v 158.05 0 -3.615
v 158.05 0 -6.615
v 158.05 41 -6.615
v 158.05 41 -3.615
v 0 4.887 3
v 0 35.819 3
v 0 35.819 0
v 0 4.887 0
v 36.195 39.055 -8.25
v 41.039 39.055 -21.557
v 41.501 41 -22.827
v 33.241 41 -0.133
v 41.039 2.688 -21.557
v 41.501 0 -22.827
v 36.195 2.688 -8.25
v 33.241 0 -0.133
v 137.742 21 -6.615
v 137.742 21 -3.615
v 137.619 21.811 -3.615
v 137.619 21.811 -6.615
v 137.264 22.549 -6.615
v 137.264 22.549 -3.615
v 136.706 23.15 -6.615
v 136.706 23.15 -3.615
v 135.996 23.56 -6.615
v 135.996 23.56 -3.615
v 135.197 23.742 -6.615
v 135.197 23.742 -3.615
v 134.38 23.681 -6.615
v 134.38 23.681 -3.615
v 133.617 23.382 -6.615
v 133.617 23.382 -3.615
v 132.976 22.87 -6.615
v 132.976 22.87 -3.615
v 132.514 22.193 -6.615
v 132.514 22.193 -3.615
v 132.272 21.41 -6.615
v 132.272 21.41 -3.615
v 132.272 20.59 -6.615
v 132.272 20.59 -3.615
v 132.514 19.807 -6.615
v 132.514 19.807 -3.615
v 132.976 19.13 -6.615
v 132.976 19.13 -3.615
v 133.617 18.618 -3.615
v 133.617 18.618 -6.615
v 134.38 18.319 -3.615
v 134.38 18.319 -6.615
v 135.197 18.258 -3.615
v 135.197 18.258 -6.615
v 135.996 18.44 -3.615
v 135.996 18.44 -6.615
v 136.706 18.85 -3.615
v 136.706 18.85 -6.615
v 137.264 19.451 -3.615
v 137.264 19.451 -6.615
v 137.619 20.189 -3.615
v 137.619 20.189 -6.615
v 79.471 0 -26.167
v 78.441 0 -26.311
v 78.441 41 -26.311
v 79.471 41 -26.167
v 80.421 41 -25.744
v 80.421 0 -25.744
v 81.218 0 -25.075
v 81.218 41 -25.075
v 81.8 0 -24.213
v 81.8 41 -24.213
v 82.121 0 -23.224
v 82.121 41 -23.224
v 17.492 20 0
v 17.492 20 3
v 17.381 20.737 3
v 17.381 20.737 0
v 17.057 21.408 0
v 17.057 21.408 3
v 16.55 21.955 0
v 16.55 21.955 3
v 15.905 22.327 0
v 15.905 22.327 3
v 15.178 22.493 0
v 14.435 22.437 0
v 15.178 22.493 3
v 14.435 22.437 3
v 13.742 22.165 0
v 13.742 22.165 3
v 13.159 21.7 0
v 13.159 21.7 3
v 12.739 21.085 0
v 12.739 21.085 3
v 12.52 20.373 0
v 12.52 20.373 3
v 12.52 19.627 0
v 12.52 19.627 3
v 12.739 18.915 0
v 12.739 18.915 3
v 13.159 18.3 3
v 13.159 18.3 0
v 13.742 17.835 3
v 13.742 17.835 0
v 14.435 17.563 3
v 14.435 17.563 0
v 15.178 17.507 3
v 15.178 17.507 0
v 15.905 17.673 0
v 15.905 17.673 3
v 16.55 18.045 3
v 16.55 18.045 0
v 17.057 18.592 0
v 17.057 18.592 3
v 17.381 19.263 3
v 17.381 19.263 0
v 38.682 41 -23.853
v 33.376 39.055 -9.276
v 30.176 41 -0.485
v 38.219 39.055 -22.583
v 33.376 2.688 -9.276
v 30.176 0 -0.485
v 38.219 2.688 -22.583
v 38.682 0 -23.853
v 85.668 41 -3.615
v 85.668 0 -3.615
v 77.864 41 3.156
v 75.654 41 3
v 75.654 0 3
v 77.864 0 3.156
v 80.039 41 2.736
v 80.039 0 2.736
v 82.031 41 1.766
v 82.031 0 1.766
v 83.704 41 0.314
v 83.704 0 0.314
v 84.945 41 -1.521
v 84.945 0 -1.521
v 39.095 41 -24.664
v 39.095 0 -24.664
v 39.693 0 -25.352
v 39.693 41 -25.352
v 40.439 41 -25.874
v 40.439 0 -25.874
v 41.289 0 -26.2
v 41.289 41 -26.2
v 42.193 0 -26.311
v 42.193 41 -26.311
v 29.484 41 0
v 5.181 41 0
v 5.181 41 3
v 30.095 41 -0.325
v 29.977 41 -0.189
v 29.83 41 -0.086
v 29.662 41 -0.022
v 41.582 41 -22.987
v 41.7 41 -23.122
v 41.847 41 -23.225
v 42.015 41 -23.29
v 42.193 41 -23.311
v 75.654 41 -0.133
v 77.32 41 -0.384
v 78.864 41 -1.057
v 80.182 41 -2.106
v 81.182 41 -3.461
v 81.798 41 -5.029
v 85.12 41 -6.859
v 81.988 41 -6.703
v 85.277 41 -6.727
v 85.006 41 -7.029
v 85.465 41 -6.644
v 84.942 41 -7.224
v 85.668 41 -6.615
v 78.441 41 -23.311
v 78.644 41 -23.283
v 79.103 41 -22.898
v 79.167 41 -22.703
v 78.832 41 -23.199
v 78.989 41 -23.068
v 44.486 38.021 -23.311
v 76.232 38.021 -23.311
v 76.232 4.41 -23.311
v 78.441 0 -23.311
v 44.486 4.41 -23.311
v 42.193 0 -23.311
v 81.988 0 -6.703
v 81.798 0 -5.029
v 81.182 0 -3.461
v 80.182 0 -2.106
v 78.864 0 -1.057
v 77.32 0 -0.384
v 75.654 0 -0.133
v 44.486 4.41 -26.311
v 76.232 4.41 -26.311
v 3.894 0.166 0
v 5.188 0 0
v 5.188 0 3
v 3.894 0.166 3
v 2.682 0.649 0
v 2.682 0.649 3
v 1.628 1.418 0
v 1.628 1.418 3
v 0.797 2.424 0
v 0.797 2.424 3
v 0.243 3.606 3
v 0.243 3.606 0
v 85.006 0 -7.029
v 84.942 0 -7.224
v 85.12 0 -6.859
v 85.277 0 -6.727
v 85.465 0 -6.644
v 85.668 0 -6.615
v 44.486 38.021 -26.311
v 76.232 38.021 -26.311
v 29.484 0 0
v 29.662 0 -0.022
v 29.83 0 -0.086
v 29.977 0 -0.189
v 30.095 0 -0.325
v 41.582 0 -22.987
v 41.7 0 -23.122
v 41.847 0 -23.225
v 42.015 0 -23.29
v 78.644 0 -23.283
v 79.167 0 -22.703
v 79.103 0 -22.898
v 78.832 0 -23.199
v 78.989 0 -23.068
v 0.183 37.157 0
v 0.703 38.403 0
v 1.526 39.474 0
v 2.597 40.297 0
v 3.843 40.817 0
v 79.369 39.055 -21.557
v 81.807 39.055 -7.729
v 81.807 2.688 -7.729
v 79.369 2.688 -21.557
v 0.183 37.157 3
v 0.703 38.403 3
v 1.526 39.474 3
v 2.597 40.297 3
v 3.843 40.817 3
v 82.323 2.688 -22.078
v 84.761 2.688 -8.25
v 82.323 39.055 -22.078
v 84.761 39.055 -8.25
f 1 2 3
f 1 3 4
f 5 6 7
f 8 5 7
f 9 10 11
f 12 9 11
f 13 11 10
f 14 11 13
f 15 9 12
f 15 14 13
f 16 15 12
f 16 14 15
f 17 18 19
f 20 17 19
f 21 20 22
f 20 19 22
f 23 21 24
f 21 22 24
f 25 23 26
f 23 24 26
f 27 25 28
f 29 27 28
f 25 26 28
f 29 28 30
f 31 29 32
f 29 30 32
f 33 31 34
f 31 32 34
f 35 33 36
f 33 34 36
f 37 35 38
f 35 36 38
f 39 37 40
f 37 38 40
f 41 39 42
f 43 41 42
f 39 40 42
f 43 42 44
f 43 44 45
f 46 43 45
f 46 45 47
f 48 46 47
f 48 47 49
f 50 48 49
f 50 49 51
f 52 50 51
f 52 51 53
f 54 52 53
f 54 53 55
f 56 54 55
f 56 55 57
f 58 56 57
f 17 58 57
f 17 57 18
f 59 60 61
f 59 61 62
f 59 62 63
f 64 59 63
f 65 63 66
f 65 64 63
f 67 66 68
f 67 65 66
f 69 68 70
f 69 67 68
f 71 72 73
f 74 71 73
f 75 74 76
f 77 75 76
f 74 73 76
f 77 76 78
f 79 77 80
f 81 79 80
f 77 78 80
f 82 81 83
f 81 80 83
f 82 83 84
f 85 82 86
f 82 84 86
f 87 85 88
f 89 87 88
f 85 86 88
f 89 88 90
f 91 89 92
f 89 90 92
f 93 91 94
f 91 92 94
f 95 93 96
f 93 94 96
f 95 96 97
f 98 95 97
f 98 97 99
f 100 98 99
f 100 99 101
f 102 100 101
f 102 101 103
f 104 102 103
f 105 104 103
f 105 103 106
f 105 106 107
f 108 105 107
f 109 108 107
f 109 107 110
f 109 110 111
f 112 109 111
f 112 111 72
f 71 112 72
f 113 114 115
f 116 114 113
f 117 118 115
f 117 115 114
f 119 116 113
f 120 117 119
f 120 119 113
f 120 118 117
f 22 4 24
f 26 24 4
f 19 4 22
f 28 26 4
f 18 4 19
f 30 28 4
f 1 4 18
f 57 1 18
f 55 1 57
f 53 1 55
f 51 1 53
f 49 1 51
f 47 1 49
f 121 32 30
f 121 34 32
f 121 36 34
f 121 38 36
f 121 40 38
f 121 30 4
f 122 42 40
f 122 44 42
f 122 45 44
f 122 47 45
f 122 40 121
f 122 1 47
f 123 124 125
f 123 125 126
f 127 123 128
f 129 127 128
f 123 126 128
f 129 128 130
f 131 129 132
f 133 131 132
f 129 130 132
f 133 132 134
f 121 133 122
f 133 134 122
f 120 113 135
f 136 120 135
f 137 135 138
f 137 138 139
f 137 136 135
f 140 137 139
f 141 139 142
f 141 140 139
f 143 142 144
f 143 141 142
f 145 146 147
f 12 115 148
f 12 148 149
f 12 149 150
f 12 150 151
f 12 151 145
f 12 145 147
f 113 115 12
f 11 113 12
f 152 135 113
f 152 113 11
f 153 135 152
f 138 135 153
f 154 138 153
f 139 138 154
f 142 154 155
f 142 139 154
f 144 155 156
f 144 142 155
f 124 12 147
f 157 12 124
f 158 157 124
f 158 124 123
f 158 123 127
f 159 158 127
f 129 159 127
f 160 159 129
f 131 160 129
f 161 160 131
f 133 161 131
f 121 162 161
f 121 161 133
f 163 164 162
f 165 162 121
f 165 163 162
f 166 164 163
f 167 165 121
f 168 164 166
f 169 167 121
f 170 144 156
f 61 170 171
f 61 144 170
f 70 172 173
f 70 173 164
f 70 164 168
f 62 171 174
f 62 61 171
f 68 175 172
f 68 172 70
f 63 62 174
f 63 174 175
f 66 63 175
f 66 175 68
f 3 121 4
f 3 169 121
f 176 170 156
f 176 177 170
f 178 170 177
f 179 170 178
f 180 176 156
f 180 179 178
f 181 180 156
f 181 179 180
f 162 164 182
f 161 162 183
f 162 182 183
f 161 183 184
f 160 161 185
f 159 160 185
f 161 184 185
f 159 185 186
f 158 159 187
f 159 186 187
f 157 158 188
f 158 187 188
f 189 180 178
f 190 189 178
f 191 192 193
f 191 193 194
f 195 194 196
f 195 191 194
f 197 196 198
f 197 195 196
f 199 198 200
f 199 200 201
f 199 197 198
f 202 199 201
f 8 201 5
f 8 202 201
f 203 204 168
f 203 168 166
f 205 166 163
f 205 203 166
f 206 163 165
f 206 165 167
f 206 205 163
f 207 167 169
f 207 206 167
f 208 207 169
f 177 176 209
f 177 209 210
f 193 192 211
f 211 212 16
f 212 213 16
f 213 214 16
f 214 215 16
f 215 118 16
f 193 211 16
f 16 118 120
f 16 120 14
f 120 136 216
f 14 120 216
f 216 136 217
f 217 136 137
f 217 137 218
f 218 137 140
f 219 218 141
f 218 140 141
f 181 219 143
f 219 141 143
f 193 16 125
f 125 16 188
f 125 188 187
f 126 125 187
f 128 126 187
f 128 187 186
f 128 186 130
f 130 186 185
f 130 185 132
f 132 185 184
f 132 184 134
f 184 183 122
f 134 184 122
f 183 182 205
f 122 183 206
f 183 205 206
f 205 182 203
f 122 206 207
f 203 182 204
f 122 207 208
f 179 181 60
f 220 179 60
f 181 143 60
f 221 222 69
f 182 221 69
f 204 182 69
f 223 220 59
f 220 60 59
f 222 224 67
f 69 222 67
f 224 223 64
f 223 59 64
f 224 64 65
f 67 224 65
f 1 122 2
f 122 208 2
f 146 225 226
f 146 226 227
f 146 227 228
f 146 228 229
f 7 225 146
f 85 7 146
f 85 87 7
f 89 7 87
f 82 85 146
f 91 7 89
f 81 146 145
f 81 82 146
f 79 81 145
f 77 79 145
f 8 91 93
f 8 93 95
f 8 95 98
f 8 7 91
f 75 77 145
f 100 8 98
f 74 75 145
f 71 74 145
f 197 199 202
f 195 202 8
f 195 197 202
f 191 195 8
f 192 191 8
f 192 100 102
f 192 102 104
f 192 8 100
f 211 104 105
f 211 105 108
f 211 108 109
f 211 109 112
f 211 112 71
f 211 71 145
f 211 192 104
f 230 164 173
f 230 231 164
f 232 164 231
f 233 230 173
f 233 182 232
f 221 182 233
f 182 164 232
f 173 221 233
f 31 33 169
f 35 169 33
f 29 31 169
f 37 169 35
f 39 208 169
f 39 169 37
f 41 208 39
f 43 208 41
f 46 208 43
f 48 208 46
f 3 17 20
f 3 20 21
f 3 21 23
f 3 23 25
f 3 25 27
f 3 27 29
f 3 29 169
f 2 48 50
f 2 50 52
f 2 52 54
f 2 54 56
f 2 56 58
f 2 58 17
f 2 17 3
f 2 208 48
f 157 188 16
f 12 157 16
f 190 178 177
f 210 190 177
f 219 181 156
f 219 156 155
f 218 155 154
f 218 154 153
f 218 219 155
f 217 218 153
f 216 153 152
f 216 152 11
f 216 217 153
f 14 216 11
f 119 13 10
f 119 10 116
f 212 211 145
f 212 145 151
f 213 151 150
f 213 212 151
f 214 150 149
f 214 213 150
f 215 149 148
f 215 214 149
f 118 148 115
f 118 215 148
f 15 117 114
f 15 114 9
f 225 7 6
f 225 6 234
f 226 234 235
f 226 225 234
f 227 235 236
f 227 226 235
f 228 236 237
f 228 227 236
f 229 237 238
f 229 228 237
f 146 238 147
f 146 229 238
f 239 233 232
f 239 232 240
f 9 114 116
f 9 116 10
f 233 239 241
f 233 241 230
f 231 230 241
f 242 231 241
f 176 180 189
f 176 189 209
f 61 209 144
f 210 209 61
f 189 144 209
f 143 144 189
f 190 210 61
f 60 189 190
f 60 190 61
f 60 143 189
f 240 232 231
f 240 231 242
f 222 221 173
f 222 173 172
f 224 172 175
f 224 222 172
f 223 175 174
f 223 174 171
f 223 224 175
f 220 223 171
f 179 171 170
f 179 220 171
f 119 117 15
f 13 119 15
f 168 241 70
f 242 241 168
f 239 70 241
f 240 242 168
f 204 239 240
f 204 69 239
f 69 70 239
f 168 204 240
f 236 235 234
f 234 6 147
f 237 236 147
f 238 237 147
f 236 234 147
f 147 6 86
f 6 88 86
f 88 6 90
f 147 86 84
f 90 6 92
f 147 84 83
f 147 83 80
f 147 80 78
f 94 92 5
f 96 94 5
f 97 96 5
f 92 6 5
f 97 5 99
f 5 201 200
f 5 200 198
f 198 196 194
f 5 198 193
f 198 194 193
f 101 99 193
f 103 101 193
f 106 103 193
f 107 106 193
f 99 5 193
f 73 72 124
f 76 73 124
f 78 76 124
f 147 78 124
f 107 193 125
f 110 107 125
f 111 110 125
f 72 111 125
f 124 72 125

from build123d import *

# Parameters (mm, degrees)
BASE_FLANGE1_DEPTH  = 41
SKETCH2_R           = 2.5
CUT_EXTRUDE1_DEPTH  = 10
SKETCH3_R           = 2.75
SKETCH3_R_2         = 2.5
CUT_EXTRUDE2_DEPTH  = 10
BOSS_EXTRUDE1_START = -41
BOSS_EXTRUDE1_DEPTH = 41
SKETCH5_W           = 31.746142427
SKETCH5_H           = 33.611284957
CUT_EXTRUDE3_DEPTH  = 19
CUT_EXTRUDE4_START  = 2.688066512
CUT_EXTRUDE4_DEPTH  = 36.36668128
CUT_EXTRUDE5_DEPTH  = 3


# Read off the part's stored shape, not the designer's step: Cut-Extrude4, Cut-Extrude5
# Sheet-metal steps are written as plain solids
with BuildPart() as part:
    # Sketch1 → Base-Flange1 (new body)
    with BuildSketch(Plane(origin=(0, 0, 0), x_dir=(1, 0, 0), z_dir=(0, 1, 0))):
        with BuildLine():
            Line((0, 0), (29.484227127, 0))
            ThreePointArc((29.484227127, 0), (29.90672353, 0.133212604), (30.176404712, 0.484667962))
            Line((30.176404712, 0.484667962), (38.681704054, 23.85278585))
            ThreePointArc((38.681704054, 23.85278585), (40.049733788, 25.635636911), (42.1929595, 26.311393382))
            Line((42.1929595, 26.311393382), (78.441184331, 26.311393382))
            ThreePointArc((78.441184331, 26.311393382), (80.843024514, 25.437195048), (82.121016981, 23.223647163))
            Line((82.121016981, 23.223647163), (84.942198964, 7.223929074))
            ThreePointArc((84.942198964, 7.223929074), (85.194131001, 6.787569985), (85.667608355, 6.615238322))
            Line((85.667608355, 6.615238322), (158.049527566, 6.615238322))
            Line((158.049527566, 6.615238322), (158.049527566, 3.615238322))
            Line((158.049527566, 3.615238322), (85.667608355, 3.615238322))
            ThreePointArc((85.667608355, 3.615238322), (83.265768172, 4.489436656), (81.987775705, 6.702984541))
            Line((81.987775705, 6.702984541), (79.166593722, 22.70270263))
            ThreePointArc((79.166593722, 22.70270263), (78.914661685, 23.139061719), (78.441184331, 23.311393382))
            Line((78.441184331, 23.311393382), (42.1929595, 23.311393382))
            ThreePointArc((42.1929595, 23.311393382), (41.770463097, 23.178180778), (41.500781916, 22.82672542))
            Line((41.500781916, 22.82672542), (32.995482574, -0.541392468))
            ThreePointArc((32.995482574, -0.541392468), (31.627452839, -2.324243529), (29.484227127, -3))
            Line((29.484227127, -3), (0, -3))
            Line((0, -3), (0, 0))
        make_face()
    extrude(amount=BASE_FLANGE1_DEPTH)

    # Sketch2 → Cut-Extrude1 (cut)
    with BuildSketch(Plane.XY.offset(3)):
        with Locations((14.991664351, 20)):
            Circle(SKETCH2_R)
    extrude(amount=-CUT_EXTRUDE1_DEPTH, mode=Mode.SUBTRACT)

    # Sketch3 → Cut-Extrude2 (cut)
    with BuildSketch(Plane.XY.offset(-3.615238322)):
        with Locations((134.991664351, 21)):
            Circle(SKETCH3_R)
        with Locations((14.991664351, 20)):
            Circle(SKETCH3_R_2)
    extrude(amount=-CUT_EXTRUDE2_DEPTH, mode=Mode.SUBTRACT)

    # Sketch4 → Boss-Extrude1 (add)
    with BuildSketch(Plane(origin=(0, 41, 0), x_dir=(1, 0, 0), z_dir=(0, 1, 0)).offset(BOSS_EXTRUDE1_START)):
        with BuildLine():
            Line((29.484227127, -3), (75.654085032, -3))
            ThreePointArc((75.654085032, -3), (82.030907409, -1.766249423), (85.667608355, 3.615238322))
            ThreePointArc((85.667608355, 3.615238322), (83.265768172, 4.489436656), (81.987775705, 6.702984541))
            ThreePointArc((81.987775705, 6.702984541), (80.181574687, 2.106348284), (75.654085032, 0.133212604))
            Line((75.654085032, 0.133212604), (29.90672353, 0.133212604))
            Line((29.90672353, 0.133212604), (29.484227127, -3))
        make_face()
    extrude(amount=BOSS_EXTRUDE1_DEPTH)

    # Sketch5 → Cut-Extrude3 (cut)
    with BuildSketch(Plane.XY.offset(-23.311393382)):
        with Locations((60.358708807, 21.215436548)):
            Rectangle(SKETCH5_W, SKETCH5_H)
    extrude(amount=-CUT_EXTRUDE3_DEPTH, mode=Mode.SUBTRACT)

    # Cut-Extrude4 outline → Cut-Extrude4 (cut)
    with BuildSketch(Plane(origin=(0, 0, 0), x_dir=(1, 0, 0), z_dir=(0, 1, 0)).offset(CUT_EXTRUDE4_START)):
        Polygon((79.368642173, 21.556828923), (81.806889388, 7.728841823), (84.761312647, 8.249786356), (82.323065432, 22.077773456), align=None)
        Polygon((38.219499528, 22.582889353), (33.376132128, 9.275846786), (36.19520999, 8.249786356), (41.038577391, 21.556828923), align=None)
    extrude(amount=CUT_EXTRUDE4_DEPTH, mode=Mode.SUBTRACT)

    # Cut-Extrude5 outline → Cut-Extrude5 (cut)
    with BuildSketch(Plane.XY):
        with BuildLine():
            Line((0, 41), (0, 35.818729295))
            ThreePointArc((0, 35.818729295), (1.526422616, 39.473577384), (5.181270705, 41))
            Line((5.181270705, 41), (0, 41))
        make_face()
        with BuildLine():
            ThreePointArc((5.188265578, 0), (1.627560559, 1.417661865), (0, 4.887450335))
            Line((0, 4.887450335), (0, 0))
            Line((0, 0), (5.188265578, 0))
        make_face()
    extrude(amount=CUT_EXTRUDE5_DEPTH, mode=Mode.SUBTRACT)


solid = part.part
